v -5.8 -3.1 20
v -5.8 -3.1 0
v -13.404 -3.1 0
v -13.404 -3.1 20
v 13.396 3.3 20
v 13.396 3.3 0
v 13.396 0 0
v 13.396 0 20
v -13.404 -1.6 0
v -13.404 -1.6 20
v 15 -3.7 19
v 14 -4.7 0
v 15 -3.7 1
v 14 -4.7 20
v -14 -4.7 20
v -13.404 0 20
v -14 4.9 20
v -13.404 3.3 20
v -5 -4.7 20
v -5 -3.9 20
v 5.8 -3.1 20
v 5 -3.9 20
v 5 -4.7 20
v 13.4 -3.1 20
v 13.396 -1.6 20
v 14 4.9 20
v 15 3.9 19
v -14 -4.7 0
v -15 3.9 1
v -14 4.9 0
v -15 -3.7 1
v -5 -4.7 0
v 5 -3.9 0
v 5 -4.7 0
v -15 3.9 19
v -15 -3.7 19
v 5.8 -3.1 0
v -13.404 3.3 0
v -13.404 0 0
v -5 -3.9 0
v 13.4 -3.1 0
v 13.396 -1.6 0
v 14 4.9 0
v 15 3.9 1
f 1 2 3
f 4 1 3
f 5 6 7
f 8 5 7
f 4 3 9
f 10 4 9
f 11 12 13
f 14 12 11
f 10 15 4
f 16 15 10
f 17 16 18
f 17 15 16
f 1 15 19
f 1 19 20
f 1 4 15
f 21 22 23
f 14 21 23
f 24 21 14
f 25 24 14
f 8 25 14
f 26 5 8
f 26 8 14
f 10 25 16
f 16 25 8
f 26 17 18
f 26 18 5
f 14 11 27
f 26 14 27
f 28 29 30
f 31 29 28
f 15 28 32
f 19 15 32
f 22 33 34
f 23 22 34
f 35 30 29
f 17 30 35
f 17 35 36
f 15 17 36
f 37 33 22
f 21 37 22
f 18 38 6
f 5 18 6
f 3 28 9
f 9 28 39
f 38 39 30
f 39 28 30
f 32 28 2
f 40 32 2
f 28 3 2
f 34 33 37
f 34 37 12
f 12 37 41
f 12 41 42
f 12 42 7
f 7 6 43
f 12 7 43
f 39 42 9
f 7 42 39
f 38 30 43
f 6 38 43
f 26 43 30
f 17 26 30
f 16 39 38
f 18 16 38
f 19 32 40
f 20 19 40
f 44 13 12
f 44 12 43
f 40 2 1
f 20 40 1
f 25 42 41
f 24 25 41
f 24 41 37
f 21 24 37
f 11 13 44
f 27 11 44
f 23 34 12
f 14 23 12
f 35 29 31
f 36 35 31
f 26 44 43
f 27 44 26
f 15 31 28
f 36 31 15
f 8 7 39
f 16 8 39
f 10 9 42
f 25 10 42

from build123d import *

# Parameters (mm, degrees)
F1_DEPTH = 20
F2_SIZE  = 0.8
F3_SIZE  = 1


with BuildPart() as f1:
    # F0 (on Top) → F1 (new body)
    with BuildSketch(Plane.XY):
        Polygon((-15, 4.9), (-15, 0), (-13.403978, 0), (-13.403978, 3.3), (13.396022, 3.3), (13.396022, 0), (15, 0), (15, 4.9), align=None)
        Polygon((-13.403978, 0), (-15, 0), (-15, -4.7), (-5, -4.7), (-5, -3.1), (-13.403978, -3.1), (-13.403978, -1.6), (13.396022, -1.600005), (13.399751, -3.1), (5, -3.1), (5, -4.7), (15, -4.7), (15, 0), (13.396022, 0), align=None)
    extrude(amount=F1_DEPTH)

    # F2
    f2_edges = [f1.edges().sort_by_distance(p)[0] for p in [
        (-5, -3.1, 10),
        (5, -3.1, 10),
    ]]
    chamfer(f2_edges, length=F2_SIZE)

    # F3
    f3_edges = [f1.edges().sort_by_distance(p)[0] for p in [
        (-15, 4.9, 10),
        (-15, 0.1, 20),
        (-15, -4.7, 10),
        (-15, 0.1, 0),
        (15, 4.9, 10),
        (15, 0.1, 0),
        (15, -4.7, 10),
        (15, 0.1, 20),
    ]]
    chamfer(f3_edges, length=F3_SIZE)


solid = f1.part
